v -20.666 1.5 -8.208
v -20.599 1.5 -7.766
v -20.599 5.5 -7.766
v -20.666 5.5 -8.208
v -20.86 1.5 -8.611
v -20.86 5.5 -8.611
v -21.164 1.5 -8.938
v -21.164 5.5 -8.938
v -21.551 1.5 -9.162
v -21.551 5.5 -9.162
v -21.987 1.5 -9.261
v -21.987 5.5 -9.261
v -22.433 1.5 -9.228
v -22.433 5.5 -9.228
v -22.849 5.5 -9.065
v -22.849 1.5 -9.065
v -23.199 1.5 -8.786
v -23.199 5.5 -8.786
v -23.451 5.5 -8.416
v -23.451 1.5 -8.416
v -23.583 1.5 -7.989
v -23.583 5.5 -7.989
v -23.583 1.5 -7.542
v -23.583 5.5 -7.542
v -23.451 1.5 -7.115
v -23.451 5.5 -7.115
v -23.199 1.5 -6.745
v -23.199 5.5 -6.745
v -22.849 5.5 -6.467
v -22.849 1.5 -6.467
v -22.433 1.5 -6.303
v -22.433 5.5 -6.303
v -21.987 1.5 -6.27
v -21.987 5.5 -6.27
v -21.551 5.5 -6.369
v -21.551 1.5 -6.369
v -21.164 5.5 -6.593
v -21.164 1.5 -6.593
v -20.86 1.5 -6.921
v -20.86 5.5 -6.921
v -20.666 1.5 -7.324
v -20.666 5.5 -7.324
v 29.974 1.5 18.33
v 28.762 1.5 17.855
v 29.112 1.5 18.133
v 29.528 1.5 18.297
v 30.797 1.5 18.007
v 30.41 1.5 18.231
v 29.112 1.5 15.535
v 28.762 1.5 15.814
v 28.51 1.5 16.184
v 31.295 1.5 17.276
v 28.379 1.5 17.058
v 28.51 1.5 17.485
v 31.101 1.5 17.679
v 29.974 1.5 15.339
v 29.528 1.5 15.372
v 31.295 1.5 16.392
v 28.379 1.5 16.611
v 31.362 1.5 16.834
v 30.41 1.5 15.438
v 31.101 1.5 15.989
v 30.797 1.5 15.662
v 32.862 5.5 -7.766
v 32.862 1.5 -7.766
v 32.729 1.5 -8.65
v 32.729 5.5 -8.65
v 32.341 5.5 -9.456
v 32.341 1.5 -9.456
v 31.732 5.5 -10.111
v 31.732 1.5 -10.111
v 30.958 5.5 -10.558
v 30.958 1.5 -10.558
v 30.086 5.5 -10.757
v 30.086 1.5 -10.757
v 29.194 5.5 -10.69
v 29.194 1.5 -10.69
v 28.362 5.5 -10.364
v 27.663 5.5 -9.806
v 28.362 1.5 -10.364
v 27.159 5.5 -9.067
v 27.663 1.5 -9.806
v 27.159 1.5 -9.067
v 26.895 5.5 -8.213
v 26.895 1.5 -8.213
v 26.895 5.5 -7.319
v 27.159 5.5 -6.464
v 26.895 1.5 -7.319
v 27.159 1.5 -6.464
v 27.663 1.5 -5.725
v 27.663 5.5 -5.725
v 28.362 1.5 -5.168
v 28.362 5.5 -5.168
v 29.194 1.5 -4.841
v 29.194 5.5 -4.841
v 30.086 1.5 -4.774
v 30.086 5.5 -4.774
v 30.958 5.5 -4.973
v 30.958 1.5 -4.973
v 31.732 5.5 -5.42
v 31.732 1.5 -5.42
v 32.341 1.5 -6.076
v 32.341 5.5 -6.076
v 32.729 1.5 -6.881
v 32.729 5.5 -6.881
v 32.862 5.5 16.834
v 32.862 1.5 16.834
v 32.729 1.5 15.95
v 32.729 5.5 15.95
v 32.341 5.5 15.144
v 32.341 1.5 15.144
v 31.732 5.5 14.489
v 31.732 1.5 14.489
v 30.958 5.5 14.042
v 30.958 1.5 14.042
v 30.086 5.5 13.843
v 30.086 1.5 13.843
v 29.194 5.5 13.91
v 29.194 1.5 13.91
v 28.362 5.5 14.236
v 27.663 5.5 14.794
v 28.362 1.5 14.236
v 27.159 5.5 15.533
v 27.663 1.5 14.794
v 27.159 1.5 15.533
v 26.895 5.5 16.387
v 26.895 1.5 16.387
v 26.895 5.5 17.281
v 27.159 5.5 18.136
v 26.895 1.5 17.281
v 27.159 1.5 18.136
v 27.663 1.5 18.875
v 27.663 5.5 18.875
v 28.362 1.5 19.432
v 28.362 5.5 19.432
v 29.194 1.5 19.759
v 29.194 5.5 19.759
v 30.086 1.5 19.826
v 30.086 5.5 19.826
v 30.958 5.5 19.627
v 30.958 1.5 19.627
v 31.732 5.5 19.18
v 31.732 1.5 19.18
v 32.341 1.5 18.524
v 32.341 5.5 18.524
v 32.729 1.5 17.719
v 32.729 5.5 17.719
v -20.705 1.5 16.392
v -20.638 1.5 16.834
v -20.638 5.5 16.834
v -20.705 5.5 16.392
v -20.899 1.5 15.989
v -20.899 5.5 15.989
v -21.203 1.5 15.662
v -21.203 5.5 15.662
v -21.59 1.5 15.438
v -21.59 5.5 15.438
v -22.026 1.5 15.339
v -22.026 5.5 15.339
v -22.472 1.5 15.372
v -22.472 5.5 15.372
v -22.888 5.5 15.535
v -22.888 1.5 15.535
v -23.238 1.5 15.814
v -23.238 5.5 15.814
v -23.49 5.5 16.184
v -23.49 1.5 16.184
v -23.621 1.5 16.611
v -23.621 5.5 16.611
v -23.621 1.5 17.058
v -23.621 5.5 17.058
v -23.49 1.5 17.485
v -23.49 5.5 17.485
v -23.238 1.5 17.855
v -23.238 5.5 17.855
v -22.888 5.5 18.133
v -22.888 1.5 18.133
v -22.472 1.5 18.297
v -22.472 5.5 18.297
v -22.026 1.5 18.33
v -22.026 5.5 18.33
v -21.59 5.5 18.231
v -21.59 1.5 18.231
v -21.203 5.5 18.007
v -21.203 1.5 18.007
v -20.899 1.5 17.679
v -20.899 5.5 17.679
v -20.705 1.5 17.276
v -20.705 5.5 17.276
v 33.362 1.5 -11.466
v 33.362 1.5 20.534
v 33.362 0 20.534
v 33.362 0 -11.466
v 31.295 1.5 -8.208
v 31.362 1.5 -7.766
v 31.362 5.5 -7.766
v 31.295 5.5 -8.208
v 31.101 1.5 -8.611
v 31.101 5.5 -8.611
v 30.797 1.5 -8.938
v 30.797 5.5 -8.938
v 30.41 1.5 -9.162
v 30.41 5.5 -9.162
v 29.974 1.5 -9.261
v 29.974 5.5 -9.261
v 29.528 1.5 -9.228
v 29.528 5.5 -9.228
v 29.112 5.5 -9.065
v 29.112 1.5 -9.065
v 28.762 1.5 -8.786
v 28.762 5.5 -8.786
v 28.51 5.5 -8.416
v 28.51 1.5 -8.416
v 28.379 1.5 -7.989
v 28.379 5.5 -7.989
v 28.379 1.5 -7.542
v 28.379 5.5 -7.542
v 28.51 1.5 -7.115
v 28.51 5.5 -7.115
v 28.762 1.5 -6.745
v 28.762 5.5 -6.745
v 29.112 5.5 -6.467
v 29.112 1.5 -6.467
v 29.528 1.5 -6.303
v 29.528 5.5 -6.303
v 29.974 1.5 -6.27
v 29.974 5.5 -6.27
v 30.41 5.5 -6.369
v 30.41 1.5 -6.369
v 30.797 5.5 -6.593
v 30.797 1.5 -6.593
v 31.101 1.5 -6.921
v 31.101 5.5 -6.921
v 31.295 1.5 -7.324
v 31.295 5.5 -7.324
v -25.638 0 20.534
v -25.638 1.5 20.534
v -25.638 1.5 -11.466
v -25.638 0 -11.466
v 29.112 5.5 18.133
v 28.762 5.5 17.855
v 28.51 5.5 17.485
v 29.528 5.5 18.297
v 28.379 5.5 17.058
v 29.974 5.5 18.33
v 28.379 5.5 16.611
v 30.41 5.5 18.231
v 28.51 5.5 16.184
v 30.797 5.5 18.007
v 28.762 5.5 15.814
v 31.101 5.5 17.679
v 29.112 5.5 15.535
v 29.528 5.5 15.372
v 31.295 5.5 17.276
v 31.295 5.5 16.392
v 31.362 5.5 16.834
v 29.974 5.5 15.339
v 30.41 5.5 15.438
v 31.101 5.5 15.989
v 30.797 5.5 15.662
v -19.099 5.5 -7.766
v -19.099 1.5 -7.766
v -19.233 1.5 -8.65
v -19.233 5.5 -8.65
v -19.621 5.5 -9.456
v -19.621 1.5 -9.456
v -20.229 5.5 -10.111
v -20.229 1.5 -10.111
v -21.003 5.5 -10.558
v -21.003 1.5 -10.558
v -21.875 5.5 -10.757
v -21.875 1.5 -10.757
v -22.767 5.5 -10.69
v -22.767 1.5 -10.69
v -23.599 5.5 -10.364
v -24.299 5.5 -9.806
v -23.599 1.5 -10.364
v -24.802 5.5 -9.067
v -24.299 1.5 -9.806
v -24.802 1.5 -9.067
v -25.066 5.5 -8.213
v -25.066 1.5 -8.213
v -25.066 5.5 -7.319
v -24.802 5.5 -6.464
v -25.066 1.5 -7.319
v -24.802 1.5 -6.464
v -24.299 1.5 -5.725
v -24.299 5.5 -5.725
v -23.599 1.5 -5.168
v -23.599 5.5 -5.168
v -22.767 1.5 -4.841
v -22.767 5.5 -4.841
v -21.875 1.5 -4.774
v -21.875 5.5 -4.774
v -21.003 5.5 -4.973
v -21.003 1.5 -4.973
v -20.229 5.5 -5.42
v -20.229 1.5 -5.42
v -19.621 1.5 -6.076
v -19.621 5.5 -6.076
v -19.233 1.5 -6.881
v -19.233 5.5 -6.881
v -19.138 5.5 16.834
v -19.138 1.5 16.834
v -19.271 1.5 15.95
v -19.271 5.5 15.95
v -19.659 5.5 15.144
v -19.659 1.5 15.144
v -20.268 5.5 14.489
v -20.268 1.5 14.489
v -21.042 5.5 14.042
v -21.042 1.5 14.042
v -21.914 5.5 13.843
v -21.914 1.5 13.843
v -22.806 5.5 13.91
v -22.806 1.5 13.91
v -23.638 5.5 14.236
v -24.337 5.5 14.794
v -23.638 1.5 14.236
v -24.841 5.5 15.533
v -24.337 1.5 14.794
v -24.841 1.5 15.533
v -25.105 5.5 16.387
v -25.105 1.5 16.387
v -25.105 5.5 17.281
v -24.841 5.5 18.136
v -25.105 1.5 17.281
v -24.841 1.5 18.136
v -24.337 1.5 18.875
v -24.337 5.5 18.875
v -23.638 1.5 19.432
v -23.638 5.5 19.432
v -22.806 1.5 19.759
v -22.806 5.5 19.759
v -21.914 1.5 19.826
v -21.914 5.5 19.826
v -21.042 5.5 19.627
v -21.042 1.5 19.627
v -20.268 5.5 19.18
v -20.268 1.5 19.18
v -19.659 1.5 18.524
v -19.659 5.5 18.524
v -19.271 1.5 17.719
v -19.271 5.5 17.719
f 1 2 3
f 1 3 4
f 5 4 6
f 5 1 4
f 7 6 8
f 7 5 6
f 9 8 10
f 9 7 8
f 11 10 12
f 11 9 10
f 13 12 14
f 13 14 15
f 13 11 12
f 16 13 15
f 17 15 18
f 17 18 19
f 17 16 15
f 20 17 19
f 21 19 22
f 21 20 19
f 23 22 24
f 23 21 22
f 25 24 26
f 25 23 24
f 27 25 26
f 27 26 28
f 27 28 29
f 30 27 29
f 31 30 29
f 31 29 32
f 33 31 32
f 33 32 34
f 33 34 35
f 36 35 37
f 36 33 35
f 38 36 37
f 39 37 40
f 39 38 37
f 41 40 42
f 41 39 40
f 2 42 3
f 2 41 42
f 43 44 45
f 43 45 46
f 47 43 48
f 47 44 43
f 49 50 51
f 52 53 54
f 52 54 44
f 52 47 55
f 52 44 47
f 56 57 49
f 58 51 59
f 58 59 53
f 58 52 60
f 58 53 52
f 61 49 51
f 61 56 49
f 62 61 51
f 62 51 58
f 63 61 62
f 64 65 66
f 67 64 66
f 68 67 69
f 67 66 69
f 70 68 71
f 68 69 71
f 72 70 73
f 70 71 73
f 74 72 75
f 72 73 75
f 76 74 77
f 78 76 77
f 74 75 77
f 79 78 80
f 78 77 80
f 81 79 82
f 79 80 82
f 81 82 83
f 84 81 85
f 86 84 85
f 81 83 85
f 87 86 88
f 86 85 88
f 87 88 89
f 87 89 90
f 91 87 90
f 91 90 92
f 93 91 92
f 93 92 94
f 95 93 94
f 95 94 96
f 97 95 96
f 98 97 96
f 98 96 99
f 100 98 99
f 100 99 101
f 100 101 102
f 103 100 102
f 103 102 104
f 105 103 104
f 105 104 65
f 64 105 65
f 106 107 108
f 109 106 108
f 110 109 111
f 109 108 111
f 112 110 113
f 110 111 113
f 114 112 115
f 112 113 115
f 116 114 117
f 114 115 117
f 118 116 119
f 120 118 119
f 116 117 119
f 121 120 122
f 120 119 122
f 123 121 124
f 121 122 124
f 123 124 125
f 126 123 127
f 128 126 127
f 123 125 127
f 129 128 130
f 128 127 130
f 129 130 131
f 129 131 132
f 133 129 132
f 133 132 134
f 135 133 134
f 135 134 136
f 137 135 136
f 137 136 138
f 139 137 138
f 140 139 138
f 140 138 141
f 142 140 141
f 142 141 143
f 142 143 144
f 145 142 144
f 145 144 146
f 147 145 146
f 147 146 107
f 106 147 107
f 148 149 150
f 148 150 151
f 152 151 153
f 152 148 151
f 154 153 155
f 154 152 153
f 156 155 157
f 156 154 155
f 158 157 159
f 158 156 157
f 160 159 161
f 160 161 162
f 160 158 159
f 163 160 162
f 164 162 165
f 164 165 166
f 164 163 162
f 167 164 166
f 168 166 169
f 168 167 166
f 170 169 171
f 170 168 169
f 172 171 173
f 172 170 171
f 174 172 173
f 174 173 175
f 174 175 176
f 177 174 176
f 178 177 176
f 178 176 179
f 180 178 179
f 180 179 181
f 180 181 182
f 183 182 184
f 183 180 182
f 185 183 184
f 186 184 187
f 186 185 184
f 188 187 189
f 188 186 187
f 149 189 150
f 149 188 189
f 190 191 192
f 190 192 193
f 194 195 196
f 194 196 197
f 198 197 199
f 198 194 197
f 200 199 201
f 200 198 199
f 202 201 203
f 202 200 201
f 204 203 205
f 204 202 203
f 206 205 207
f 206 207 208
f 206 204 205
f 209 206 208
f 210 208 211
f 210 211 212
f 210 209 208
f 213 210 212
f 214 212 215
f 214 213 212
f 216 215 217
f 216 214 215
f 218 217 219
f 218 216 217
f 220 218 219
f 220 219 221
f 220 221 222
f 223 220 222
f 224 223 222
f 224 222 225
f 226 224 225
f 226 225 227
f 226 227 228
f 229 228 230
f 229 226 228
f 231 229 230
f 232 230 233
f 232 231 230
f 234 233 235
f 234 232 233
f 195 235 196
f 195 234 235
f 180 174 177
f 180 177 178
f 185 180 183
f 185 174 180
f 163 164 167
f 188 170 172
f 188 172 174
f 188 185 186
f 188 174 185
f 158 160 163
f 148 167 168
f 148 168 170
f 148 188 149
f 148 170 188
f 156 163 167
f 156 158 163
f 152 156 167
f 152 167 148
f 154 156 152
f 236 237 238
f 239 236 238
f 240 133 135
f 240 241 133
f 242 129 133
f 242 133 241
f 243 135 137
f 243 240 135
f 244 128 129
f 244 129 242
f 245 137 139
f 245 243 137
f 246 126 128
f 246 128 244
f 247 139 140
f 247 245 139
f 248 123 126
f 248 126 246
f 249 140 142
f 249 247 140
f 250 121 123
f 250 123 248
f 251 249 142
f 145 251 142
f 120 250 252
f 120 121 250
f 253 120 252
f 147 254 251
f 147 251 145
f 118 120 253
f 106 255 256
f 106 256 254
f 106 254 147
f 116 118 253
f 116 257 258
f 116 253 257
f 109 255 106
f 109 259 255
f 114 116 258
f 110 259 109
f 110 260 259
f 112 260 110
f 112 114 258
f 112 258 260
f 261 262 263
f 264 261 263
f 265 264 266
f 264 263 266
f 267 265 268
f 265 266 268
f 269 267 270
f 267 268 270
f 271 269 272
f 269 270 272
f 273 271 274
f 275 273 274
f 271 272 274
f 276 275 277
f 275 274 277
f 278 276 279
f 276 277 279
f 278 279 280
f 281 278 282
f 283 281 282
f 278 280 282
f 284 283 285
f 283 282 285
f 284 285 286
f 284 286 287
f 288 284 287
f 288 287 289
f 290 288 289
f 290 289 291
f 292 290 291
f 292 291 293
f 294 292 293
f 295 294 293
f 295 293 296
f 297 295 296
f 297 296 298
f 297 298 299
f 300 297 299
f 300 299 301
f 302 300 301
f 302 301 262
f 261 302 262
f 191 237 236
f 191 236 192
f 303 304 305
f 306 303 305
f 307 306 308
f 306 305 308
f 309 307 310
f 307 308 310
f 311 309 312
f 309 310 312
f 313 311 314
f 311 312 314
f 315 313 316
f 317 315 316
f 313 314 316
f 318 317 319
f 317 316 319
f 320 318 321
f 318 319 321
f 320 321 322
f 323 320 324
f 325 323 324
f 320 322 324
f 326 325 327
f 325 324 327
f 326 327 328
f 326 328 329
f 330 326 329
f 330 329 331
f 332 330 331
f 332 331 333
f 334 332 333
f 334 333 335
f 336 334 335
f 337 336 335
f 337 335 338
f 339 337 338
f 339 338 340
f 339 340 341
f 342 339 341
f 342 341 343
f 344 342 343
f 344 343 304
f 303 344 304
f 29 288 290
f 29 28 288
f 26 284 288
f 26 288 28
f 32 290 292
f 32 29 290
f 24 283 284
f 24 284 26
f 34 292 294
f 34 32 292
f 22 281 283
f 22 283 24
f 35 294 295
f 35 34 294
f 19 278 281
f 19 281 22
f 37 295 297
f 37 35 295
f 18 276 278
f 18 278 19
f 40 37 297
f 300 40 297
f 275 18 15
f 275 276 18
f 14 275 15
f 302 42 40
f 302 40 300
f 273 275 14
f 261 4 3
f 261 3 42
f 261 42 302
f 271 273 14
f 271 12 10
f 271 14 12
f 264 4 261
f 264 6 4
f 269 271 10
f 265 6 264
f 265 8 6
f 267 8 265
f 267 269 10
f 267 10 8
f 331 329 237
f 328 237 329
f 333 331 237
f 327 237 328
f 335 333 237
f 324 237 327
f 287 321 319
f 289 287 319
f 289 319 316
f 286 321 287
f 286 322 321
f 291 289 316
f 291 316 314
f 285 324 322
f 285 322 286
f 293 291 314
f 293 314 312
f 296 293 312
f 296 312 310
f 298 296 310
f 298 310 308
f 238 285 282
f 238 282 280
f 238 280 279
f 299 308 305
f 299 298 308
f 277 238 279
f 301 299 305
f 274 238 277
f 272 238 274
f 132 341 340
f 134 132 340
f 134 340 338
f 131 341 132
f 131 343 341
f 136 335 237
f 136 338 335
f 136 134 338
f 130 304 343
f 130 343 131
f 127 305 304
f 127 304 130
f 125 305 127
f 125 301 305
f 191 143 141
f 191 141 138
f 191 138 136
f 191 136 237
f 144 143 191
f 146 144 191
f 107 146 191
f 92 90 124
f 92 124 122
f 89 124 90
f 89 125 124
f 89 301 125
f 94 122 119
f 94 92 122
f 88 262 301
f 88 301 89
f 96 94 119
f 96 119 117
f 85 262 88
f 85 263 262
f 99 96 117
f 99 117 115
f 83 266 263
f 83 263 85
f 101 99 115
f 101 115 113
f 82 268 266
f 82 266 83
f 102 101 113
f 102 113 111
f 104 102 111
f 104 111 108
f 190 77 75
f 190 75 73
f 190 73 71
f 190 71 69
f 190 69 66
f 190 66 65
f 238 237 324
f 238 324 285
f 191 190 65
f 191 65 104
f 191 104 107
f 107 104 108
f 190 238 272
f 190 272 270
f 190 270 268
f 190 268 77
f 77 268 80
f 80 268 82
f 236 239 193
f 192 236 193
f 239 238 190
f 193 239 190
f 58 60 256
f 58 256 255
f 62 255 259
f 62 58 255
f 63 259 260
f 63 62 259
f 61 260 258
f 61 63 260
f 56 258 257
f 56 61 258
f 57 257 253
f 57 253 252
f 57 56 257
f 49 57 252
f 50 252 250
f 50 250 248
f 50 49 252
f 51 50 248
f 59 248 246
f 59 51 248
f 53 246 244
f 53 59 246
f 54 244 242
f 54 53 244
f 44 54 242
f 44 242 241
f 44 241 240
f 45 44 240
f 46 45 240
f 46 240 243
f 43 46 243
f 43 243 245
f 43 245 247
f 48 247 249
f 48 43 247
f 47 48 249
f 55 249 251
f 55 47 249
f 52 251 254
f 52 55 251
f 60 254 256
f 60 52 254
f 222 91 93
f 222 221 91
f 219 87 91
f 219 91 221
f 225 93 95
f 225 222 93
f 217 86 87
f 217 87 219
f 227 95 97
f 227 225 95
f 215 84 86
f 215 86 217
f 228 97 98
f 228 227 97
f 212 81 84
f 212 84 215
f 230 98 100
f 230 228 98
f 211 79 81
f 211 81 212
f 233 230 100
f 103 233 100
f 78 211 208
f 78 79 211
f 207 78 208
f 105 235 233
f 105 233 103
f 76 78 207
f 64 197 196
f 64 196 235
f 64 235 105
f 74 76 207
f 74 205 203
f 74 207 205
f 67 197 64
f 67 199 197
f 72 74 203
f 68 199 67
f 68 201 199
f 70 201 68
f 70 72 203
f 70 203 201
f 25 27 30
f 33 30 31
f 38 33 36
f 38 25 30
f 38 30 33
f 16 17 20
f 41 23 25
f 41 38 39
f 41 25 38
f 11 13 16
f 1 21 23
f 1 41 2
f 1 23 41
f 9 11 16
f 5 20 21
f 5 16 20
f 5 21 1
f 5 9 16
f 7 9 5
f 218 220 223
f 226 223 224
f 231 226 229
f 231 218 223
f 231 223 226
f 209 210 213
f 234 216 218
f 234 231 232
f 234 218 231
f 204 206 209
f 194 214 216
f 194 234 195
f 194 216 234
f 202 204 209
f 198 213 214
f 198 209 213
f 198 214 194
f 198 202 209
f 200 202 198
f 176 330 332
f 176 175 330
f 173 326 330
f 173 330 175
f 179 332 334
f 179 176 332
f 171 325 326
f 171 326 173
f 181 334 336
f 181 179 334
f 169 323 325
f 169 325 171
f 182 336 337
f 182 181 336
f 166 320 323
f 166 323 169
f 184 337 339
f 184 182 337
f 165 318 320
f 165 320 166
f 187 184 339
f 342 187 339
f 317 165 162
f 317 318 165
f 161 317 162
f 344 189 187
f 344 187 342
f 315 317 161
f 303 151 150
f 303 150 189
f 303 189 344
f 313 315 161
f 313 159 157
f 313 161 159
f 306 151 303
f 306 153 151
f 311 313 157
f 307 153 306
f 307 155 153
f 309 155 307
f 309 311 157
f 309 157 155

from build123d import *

# Parameters (mm, degrees)
SKETCH_2_W          = 57
SKETCH_2_H          = 40.4
EXTRUDE_1_DEPTH     = 1.5
SKETCH_4_R          = 3
SKETCH_4_R_2        = 1.5
EXTRUDE_3_DEPTH     = 4
SKETCH_5_W          = 57
SKETCH_5_H          = 4.2
CUT_EXTRUDE_1_DEPTH = 2.5
SKETCH_6_W          = 1
SKETCH_6_H          = 32
EXTRUDE_4_DEPTH     = 1.5


with BuildPart() as part:
    # 草图2 → 凸台-拉伸1 (new body)
    with BuildSketch(Plane(origin=(0, 0, 0), x_dir=(1, 0, 0), z_dir=(0, 1, 0))):
        with Locations((3.861898857, -4.534326193)):
            Rectangle(SKETCH_2_W, SKETCH_2_H)
    extrude(amount=EXTRUDE_1_DEPTH)

    # 草图4 → 凸台-拉伸3 (add)
    with BuildSketch(Plane(origin=(0, 1.5, 0), x_dir=(1, 0, 0), z_dir=(0, 1, 0))):
        with Locations((-22.099370277, 7.765673807)):
            Circle(SKETCH_4_R)
        with Locations((-22.099370277, 7.765673807)):
            Circle(SKETCH_4_R_2, mode=Mode.SUBTRACT)
        with Locations((-22.138101143, -16.834326193)):
            Circle(SKETCH_4_R)
        with Locations((-22.138101143, -16.834326193)):
            Circle(SKETCH_4_R_2, mode=Mode.SUBTRACT)
        with Locations((29.861898857, -16.834326193)):
            Circle(SKETCH_4_R)
        with Locations((29.861898857, -16.834326193)):
            Circle(SKETCH_4_R_2, mode=Mode.SUBTRACT)
        with Locations((29.861898857, 7.765673807)):
            Circle(SKETCH_4_R)
        with Locations((29.861898857, 7.765673807)):
            Circle(SKETCH_4_R_2, mode=Mode.SUBTRACT)
    extrude(amount=EXTRUDE_3_DEPTH)

    # 草图5 → 切除-拉伸1 (cut, through all)
    with BuildSketch(Plane(origin=(0, 1.5, 0), x_dir=(1, 0, 0), z_dir=(0, 1, 0))):
        with Locations((3.861898857, 13.565673807)):
            Rectangle(SKETCH_5_W, SKETCH_5_H)
        with Locations((3.861898857, -22.634326193)):
            Rectangle(SKETCH_5_W, SKETCH_5_H)
    extrude(amount=-CUT_EXTRUDE_1_DEPTH, mode=Mode.SUBTRACT)

    # 草图6 → 凸台-拉伸4 (add)
    with BuildSketch(Plane(origin=(0, 1.5, 0), x_dir=(1, 0, 0), z_dir=(0, 1, 0))):
        with Locations((-25.138101143, -4.534326193)):
            Rectangle(SKETCH_6_W, SKETCH_6_H)
        with Locations((32.861898857, -4.534326193)):
            Rectangle(SKETCH_6_W, SKETCH_6_H)
    extrude(amount=-EXTRUDE_4_DEPTH)


solid = part.part
